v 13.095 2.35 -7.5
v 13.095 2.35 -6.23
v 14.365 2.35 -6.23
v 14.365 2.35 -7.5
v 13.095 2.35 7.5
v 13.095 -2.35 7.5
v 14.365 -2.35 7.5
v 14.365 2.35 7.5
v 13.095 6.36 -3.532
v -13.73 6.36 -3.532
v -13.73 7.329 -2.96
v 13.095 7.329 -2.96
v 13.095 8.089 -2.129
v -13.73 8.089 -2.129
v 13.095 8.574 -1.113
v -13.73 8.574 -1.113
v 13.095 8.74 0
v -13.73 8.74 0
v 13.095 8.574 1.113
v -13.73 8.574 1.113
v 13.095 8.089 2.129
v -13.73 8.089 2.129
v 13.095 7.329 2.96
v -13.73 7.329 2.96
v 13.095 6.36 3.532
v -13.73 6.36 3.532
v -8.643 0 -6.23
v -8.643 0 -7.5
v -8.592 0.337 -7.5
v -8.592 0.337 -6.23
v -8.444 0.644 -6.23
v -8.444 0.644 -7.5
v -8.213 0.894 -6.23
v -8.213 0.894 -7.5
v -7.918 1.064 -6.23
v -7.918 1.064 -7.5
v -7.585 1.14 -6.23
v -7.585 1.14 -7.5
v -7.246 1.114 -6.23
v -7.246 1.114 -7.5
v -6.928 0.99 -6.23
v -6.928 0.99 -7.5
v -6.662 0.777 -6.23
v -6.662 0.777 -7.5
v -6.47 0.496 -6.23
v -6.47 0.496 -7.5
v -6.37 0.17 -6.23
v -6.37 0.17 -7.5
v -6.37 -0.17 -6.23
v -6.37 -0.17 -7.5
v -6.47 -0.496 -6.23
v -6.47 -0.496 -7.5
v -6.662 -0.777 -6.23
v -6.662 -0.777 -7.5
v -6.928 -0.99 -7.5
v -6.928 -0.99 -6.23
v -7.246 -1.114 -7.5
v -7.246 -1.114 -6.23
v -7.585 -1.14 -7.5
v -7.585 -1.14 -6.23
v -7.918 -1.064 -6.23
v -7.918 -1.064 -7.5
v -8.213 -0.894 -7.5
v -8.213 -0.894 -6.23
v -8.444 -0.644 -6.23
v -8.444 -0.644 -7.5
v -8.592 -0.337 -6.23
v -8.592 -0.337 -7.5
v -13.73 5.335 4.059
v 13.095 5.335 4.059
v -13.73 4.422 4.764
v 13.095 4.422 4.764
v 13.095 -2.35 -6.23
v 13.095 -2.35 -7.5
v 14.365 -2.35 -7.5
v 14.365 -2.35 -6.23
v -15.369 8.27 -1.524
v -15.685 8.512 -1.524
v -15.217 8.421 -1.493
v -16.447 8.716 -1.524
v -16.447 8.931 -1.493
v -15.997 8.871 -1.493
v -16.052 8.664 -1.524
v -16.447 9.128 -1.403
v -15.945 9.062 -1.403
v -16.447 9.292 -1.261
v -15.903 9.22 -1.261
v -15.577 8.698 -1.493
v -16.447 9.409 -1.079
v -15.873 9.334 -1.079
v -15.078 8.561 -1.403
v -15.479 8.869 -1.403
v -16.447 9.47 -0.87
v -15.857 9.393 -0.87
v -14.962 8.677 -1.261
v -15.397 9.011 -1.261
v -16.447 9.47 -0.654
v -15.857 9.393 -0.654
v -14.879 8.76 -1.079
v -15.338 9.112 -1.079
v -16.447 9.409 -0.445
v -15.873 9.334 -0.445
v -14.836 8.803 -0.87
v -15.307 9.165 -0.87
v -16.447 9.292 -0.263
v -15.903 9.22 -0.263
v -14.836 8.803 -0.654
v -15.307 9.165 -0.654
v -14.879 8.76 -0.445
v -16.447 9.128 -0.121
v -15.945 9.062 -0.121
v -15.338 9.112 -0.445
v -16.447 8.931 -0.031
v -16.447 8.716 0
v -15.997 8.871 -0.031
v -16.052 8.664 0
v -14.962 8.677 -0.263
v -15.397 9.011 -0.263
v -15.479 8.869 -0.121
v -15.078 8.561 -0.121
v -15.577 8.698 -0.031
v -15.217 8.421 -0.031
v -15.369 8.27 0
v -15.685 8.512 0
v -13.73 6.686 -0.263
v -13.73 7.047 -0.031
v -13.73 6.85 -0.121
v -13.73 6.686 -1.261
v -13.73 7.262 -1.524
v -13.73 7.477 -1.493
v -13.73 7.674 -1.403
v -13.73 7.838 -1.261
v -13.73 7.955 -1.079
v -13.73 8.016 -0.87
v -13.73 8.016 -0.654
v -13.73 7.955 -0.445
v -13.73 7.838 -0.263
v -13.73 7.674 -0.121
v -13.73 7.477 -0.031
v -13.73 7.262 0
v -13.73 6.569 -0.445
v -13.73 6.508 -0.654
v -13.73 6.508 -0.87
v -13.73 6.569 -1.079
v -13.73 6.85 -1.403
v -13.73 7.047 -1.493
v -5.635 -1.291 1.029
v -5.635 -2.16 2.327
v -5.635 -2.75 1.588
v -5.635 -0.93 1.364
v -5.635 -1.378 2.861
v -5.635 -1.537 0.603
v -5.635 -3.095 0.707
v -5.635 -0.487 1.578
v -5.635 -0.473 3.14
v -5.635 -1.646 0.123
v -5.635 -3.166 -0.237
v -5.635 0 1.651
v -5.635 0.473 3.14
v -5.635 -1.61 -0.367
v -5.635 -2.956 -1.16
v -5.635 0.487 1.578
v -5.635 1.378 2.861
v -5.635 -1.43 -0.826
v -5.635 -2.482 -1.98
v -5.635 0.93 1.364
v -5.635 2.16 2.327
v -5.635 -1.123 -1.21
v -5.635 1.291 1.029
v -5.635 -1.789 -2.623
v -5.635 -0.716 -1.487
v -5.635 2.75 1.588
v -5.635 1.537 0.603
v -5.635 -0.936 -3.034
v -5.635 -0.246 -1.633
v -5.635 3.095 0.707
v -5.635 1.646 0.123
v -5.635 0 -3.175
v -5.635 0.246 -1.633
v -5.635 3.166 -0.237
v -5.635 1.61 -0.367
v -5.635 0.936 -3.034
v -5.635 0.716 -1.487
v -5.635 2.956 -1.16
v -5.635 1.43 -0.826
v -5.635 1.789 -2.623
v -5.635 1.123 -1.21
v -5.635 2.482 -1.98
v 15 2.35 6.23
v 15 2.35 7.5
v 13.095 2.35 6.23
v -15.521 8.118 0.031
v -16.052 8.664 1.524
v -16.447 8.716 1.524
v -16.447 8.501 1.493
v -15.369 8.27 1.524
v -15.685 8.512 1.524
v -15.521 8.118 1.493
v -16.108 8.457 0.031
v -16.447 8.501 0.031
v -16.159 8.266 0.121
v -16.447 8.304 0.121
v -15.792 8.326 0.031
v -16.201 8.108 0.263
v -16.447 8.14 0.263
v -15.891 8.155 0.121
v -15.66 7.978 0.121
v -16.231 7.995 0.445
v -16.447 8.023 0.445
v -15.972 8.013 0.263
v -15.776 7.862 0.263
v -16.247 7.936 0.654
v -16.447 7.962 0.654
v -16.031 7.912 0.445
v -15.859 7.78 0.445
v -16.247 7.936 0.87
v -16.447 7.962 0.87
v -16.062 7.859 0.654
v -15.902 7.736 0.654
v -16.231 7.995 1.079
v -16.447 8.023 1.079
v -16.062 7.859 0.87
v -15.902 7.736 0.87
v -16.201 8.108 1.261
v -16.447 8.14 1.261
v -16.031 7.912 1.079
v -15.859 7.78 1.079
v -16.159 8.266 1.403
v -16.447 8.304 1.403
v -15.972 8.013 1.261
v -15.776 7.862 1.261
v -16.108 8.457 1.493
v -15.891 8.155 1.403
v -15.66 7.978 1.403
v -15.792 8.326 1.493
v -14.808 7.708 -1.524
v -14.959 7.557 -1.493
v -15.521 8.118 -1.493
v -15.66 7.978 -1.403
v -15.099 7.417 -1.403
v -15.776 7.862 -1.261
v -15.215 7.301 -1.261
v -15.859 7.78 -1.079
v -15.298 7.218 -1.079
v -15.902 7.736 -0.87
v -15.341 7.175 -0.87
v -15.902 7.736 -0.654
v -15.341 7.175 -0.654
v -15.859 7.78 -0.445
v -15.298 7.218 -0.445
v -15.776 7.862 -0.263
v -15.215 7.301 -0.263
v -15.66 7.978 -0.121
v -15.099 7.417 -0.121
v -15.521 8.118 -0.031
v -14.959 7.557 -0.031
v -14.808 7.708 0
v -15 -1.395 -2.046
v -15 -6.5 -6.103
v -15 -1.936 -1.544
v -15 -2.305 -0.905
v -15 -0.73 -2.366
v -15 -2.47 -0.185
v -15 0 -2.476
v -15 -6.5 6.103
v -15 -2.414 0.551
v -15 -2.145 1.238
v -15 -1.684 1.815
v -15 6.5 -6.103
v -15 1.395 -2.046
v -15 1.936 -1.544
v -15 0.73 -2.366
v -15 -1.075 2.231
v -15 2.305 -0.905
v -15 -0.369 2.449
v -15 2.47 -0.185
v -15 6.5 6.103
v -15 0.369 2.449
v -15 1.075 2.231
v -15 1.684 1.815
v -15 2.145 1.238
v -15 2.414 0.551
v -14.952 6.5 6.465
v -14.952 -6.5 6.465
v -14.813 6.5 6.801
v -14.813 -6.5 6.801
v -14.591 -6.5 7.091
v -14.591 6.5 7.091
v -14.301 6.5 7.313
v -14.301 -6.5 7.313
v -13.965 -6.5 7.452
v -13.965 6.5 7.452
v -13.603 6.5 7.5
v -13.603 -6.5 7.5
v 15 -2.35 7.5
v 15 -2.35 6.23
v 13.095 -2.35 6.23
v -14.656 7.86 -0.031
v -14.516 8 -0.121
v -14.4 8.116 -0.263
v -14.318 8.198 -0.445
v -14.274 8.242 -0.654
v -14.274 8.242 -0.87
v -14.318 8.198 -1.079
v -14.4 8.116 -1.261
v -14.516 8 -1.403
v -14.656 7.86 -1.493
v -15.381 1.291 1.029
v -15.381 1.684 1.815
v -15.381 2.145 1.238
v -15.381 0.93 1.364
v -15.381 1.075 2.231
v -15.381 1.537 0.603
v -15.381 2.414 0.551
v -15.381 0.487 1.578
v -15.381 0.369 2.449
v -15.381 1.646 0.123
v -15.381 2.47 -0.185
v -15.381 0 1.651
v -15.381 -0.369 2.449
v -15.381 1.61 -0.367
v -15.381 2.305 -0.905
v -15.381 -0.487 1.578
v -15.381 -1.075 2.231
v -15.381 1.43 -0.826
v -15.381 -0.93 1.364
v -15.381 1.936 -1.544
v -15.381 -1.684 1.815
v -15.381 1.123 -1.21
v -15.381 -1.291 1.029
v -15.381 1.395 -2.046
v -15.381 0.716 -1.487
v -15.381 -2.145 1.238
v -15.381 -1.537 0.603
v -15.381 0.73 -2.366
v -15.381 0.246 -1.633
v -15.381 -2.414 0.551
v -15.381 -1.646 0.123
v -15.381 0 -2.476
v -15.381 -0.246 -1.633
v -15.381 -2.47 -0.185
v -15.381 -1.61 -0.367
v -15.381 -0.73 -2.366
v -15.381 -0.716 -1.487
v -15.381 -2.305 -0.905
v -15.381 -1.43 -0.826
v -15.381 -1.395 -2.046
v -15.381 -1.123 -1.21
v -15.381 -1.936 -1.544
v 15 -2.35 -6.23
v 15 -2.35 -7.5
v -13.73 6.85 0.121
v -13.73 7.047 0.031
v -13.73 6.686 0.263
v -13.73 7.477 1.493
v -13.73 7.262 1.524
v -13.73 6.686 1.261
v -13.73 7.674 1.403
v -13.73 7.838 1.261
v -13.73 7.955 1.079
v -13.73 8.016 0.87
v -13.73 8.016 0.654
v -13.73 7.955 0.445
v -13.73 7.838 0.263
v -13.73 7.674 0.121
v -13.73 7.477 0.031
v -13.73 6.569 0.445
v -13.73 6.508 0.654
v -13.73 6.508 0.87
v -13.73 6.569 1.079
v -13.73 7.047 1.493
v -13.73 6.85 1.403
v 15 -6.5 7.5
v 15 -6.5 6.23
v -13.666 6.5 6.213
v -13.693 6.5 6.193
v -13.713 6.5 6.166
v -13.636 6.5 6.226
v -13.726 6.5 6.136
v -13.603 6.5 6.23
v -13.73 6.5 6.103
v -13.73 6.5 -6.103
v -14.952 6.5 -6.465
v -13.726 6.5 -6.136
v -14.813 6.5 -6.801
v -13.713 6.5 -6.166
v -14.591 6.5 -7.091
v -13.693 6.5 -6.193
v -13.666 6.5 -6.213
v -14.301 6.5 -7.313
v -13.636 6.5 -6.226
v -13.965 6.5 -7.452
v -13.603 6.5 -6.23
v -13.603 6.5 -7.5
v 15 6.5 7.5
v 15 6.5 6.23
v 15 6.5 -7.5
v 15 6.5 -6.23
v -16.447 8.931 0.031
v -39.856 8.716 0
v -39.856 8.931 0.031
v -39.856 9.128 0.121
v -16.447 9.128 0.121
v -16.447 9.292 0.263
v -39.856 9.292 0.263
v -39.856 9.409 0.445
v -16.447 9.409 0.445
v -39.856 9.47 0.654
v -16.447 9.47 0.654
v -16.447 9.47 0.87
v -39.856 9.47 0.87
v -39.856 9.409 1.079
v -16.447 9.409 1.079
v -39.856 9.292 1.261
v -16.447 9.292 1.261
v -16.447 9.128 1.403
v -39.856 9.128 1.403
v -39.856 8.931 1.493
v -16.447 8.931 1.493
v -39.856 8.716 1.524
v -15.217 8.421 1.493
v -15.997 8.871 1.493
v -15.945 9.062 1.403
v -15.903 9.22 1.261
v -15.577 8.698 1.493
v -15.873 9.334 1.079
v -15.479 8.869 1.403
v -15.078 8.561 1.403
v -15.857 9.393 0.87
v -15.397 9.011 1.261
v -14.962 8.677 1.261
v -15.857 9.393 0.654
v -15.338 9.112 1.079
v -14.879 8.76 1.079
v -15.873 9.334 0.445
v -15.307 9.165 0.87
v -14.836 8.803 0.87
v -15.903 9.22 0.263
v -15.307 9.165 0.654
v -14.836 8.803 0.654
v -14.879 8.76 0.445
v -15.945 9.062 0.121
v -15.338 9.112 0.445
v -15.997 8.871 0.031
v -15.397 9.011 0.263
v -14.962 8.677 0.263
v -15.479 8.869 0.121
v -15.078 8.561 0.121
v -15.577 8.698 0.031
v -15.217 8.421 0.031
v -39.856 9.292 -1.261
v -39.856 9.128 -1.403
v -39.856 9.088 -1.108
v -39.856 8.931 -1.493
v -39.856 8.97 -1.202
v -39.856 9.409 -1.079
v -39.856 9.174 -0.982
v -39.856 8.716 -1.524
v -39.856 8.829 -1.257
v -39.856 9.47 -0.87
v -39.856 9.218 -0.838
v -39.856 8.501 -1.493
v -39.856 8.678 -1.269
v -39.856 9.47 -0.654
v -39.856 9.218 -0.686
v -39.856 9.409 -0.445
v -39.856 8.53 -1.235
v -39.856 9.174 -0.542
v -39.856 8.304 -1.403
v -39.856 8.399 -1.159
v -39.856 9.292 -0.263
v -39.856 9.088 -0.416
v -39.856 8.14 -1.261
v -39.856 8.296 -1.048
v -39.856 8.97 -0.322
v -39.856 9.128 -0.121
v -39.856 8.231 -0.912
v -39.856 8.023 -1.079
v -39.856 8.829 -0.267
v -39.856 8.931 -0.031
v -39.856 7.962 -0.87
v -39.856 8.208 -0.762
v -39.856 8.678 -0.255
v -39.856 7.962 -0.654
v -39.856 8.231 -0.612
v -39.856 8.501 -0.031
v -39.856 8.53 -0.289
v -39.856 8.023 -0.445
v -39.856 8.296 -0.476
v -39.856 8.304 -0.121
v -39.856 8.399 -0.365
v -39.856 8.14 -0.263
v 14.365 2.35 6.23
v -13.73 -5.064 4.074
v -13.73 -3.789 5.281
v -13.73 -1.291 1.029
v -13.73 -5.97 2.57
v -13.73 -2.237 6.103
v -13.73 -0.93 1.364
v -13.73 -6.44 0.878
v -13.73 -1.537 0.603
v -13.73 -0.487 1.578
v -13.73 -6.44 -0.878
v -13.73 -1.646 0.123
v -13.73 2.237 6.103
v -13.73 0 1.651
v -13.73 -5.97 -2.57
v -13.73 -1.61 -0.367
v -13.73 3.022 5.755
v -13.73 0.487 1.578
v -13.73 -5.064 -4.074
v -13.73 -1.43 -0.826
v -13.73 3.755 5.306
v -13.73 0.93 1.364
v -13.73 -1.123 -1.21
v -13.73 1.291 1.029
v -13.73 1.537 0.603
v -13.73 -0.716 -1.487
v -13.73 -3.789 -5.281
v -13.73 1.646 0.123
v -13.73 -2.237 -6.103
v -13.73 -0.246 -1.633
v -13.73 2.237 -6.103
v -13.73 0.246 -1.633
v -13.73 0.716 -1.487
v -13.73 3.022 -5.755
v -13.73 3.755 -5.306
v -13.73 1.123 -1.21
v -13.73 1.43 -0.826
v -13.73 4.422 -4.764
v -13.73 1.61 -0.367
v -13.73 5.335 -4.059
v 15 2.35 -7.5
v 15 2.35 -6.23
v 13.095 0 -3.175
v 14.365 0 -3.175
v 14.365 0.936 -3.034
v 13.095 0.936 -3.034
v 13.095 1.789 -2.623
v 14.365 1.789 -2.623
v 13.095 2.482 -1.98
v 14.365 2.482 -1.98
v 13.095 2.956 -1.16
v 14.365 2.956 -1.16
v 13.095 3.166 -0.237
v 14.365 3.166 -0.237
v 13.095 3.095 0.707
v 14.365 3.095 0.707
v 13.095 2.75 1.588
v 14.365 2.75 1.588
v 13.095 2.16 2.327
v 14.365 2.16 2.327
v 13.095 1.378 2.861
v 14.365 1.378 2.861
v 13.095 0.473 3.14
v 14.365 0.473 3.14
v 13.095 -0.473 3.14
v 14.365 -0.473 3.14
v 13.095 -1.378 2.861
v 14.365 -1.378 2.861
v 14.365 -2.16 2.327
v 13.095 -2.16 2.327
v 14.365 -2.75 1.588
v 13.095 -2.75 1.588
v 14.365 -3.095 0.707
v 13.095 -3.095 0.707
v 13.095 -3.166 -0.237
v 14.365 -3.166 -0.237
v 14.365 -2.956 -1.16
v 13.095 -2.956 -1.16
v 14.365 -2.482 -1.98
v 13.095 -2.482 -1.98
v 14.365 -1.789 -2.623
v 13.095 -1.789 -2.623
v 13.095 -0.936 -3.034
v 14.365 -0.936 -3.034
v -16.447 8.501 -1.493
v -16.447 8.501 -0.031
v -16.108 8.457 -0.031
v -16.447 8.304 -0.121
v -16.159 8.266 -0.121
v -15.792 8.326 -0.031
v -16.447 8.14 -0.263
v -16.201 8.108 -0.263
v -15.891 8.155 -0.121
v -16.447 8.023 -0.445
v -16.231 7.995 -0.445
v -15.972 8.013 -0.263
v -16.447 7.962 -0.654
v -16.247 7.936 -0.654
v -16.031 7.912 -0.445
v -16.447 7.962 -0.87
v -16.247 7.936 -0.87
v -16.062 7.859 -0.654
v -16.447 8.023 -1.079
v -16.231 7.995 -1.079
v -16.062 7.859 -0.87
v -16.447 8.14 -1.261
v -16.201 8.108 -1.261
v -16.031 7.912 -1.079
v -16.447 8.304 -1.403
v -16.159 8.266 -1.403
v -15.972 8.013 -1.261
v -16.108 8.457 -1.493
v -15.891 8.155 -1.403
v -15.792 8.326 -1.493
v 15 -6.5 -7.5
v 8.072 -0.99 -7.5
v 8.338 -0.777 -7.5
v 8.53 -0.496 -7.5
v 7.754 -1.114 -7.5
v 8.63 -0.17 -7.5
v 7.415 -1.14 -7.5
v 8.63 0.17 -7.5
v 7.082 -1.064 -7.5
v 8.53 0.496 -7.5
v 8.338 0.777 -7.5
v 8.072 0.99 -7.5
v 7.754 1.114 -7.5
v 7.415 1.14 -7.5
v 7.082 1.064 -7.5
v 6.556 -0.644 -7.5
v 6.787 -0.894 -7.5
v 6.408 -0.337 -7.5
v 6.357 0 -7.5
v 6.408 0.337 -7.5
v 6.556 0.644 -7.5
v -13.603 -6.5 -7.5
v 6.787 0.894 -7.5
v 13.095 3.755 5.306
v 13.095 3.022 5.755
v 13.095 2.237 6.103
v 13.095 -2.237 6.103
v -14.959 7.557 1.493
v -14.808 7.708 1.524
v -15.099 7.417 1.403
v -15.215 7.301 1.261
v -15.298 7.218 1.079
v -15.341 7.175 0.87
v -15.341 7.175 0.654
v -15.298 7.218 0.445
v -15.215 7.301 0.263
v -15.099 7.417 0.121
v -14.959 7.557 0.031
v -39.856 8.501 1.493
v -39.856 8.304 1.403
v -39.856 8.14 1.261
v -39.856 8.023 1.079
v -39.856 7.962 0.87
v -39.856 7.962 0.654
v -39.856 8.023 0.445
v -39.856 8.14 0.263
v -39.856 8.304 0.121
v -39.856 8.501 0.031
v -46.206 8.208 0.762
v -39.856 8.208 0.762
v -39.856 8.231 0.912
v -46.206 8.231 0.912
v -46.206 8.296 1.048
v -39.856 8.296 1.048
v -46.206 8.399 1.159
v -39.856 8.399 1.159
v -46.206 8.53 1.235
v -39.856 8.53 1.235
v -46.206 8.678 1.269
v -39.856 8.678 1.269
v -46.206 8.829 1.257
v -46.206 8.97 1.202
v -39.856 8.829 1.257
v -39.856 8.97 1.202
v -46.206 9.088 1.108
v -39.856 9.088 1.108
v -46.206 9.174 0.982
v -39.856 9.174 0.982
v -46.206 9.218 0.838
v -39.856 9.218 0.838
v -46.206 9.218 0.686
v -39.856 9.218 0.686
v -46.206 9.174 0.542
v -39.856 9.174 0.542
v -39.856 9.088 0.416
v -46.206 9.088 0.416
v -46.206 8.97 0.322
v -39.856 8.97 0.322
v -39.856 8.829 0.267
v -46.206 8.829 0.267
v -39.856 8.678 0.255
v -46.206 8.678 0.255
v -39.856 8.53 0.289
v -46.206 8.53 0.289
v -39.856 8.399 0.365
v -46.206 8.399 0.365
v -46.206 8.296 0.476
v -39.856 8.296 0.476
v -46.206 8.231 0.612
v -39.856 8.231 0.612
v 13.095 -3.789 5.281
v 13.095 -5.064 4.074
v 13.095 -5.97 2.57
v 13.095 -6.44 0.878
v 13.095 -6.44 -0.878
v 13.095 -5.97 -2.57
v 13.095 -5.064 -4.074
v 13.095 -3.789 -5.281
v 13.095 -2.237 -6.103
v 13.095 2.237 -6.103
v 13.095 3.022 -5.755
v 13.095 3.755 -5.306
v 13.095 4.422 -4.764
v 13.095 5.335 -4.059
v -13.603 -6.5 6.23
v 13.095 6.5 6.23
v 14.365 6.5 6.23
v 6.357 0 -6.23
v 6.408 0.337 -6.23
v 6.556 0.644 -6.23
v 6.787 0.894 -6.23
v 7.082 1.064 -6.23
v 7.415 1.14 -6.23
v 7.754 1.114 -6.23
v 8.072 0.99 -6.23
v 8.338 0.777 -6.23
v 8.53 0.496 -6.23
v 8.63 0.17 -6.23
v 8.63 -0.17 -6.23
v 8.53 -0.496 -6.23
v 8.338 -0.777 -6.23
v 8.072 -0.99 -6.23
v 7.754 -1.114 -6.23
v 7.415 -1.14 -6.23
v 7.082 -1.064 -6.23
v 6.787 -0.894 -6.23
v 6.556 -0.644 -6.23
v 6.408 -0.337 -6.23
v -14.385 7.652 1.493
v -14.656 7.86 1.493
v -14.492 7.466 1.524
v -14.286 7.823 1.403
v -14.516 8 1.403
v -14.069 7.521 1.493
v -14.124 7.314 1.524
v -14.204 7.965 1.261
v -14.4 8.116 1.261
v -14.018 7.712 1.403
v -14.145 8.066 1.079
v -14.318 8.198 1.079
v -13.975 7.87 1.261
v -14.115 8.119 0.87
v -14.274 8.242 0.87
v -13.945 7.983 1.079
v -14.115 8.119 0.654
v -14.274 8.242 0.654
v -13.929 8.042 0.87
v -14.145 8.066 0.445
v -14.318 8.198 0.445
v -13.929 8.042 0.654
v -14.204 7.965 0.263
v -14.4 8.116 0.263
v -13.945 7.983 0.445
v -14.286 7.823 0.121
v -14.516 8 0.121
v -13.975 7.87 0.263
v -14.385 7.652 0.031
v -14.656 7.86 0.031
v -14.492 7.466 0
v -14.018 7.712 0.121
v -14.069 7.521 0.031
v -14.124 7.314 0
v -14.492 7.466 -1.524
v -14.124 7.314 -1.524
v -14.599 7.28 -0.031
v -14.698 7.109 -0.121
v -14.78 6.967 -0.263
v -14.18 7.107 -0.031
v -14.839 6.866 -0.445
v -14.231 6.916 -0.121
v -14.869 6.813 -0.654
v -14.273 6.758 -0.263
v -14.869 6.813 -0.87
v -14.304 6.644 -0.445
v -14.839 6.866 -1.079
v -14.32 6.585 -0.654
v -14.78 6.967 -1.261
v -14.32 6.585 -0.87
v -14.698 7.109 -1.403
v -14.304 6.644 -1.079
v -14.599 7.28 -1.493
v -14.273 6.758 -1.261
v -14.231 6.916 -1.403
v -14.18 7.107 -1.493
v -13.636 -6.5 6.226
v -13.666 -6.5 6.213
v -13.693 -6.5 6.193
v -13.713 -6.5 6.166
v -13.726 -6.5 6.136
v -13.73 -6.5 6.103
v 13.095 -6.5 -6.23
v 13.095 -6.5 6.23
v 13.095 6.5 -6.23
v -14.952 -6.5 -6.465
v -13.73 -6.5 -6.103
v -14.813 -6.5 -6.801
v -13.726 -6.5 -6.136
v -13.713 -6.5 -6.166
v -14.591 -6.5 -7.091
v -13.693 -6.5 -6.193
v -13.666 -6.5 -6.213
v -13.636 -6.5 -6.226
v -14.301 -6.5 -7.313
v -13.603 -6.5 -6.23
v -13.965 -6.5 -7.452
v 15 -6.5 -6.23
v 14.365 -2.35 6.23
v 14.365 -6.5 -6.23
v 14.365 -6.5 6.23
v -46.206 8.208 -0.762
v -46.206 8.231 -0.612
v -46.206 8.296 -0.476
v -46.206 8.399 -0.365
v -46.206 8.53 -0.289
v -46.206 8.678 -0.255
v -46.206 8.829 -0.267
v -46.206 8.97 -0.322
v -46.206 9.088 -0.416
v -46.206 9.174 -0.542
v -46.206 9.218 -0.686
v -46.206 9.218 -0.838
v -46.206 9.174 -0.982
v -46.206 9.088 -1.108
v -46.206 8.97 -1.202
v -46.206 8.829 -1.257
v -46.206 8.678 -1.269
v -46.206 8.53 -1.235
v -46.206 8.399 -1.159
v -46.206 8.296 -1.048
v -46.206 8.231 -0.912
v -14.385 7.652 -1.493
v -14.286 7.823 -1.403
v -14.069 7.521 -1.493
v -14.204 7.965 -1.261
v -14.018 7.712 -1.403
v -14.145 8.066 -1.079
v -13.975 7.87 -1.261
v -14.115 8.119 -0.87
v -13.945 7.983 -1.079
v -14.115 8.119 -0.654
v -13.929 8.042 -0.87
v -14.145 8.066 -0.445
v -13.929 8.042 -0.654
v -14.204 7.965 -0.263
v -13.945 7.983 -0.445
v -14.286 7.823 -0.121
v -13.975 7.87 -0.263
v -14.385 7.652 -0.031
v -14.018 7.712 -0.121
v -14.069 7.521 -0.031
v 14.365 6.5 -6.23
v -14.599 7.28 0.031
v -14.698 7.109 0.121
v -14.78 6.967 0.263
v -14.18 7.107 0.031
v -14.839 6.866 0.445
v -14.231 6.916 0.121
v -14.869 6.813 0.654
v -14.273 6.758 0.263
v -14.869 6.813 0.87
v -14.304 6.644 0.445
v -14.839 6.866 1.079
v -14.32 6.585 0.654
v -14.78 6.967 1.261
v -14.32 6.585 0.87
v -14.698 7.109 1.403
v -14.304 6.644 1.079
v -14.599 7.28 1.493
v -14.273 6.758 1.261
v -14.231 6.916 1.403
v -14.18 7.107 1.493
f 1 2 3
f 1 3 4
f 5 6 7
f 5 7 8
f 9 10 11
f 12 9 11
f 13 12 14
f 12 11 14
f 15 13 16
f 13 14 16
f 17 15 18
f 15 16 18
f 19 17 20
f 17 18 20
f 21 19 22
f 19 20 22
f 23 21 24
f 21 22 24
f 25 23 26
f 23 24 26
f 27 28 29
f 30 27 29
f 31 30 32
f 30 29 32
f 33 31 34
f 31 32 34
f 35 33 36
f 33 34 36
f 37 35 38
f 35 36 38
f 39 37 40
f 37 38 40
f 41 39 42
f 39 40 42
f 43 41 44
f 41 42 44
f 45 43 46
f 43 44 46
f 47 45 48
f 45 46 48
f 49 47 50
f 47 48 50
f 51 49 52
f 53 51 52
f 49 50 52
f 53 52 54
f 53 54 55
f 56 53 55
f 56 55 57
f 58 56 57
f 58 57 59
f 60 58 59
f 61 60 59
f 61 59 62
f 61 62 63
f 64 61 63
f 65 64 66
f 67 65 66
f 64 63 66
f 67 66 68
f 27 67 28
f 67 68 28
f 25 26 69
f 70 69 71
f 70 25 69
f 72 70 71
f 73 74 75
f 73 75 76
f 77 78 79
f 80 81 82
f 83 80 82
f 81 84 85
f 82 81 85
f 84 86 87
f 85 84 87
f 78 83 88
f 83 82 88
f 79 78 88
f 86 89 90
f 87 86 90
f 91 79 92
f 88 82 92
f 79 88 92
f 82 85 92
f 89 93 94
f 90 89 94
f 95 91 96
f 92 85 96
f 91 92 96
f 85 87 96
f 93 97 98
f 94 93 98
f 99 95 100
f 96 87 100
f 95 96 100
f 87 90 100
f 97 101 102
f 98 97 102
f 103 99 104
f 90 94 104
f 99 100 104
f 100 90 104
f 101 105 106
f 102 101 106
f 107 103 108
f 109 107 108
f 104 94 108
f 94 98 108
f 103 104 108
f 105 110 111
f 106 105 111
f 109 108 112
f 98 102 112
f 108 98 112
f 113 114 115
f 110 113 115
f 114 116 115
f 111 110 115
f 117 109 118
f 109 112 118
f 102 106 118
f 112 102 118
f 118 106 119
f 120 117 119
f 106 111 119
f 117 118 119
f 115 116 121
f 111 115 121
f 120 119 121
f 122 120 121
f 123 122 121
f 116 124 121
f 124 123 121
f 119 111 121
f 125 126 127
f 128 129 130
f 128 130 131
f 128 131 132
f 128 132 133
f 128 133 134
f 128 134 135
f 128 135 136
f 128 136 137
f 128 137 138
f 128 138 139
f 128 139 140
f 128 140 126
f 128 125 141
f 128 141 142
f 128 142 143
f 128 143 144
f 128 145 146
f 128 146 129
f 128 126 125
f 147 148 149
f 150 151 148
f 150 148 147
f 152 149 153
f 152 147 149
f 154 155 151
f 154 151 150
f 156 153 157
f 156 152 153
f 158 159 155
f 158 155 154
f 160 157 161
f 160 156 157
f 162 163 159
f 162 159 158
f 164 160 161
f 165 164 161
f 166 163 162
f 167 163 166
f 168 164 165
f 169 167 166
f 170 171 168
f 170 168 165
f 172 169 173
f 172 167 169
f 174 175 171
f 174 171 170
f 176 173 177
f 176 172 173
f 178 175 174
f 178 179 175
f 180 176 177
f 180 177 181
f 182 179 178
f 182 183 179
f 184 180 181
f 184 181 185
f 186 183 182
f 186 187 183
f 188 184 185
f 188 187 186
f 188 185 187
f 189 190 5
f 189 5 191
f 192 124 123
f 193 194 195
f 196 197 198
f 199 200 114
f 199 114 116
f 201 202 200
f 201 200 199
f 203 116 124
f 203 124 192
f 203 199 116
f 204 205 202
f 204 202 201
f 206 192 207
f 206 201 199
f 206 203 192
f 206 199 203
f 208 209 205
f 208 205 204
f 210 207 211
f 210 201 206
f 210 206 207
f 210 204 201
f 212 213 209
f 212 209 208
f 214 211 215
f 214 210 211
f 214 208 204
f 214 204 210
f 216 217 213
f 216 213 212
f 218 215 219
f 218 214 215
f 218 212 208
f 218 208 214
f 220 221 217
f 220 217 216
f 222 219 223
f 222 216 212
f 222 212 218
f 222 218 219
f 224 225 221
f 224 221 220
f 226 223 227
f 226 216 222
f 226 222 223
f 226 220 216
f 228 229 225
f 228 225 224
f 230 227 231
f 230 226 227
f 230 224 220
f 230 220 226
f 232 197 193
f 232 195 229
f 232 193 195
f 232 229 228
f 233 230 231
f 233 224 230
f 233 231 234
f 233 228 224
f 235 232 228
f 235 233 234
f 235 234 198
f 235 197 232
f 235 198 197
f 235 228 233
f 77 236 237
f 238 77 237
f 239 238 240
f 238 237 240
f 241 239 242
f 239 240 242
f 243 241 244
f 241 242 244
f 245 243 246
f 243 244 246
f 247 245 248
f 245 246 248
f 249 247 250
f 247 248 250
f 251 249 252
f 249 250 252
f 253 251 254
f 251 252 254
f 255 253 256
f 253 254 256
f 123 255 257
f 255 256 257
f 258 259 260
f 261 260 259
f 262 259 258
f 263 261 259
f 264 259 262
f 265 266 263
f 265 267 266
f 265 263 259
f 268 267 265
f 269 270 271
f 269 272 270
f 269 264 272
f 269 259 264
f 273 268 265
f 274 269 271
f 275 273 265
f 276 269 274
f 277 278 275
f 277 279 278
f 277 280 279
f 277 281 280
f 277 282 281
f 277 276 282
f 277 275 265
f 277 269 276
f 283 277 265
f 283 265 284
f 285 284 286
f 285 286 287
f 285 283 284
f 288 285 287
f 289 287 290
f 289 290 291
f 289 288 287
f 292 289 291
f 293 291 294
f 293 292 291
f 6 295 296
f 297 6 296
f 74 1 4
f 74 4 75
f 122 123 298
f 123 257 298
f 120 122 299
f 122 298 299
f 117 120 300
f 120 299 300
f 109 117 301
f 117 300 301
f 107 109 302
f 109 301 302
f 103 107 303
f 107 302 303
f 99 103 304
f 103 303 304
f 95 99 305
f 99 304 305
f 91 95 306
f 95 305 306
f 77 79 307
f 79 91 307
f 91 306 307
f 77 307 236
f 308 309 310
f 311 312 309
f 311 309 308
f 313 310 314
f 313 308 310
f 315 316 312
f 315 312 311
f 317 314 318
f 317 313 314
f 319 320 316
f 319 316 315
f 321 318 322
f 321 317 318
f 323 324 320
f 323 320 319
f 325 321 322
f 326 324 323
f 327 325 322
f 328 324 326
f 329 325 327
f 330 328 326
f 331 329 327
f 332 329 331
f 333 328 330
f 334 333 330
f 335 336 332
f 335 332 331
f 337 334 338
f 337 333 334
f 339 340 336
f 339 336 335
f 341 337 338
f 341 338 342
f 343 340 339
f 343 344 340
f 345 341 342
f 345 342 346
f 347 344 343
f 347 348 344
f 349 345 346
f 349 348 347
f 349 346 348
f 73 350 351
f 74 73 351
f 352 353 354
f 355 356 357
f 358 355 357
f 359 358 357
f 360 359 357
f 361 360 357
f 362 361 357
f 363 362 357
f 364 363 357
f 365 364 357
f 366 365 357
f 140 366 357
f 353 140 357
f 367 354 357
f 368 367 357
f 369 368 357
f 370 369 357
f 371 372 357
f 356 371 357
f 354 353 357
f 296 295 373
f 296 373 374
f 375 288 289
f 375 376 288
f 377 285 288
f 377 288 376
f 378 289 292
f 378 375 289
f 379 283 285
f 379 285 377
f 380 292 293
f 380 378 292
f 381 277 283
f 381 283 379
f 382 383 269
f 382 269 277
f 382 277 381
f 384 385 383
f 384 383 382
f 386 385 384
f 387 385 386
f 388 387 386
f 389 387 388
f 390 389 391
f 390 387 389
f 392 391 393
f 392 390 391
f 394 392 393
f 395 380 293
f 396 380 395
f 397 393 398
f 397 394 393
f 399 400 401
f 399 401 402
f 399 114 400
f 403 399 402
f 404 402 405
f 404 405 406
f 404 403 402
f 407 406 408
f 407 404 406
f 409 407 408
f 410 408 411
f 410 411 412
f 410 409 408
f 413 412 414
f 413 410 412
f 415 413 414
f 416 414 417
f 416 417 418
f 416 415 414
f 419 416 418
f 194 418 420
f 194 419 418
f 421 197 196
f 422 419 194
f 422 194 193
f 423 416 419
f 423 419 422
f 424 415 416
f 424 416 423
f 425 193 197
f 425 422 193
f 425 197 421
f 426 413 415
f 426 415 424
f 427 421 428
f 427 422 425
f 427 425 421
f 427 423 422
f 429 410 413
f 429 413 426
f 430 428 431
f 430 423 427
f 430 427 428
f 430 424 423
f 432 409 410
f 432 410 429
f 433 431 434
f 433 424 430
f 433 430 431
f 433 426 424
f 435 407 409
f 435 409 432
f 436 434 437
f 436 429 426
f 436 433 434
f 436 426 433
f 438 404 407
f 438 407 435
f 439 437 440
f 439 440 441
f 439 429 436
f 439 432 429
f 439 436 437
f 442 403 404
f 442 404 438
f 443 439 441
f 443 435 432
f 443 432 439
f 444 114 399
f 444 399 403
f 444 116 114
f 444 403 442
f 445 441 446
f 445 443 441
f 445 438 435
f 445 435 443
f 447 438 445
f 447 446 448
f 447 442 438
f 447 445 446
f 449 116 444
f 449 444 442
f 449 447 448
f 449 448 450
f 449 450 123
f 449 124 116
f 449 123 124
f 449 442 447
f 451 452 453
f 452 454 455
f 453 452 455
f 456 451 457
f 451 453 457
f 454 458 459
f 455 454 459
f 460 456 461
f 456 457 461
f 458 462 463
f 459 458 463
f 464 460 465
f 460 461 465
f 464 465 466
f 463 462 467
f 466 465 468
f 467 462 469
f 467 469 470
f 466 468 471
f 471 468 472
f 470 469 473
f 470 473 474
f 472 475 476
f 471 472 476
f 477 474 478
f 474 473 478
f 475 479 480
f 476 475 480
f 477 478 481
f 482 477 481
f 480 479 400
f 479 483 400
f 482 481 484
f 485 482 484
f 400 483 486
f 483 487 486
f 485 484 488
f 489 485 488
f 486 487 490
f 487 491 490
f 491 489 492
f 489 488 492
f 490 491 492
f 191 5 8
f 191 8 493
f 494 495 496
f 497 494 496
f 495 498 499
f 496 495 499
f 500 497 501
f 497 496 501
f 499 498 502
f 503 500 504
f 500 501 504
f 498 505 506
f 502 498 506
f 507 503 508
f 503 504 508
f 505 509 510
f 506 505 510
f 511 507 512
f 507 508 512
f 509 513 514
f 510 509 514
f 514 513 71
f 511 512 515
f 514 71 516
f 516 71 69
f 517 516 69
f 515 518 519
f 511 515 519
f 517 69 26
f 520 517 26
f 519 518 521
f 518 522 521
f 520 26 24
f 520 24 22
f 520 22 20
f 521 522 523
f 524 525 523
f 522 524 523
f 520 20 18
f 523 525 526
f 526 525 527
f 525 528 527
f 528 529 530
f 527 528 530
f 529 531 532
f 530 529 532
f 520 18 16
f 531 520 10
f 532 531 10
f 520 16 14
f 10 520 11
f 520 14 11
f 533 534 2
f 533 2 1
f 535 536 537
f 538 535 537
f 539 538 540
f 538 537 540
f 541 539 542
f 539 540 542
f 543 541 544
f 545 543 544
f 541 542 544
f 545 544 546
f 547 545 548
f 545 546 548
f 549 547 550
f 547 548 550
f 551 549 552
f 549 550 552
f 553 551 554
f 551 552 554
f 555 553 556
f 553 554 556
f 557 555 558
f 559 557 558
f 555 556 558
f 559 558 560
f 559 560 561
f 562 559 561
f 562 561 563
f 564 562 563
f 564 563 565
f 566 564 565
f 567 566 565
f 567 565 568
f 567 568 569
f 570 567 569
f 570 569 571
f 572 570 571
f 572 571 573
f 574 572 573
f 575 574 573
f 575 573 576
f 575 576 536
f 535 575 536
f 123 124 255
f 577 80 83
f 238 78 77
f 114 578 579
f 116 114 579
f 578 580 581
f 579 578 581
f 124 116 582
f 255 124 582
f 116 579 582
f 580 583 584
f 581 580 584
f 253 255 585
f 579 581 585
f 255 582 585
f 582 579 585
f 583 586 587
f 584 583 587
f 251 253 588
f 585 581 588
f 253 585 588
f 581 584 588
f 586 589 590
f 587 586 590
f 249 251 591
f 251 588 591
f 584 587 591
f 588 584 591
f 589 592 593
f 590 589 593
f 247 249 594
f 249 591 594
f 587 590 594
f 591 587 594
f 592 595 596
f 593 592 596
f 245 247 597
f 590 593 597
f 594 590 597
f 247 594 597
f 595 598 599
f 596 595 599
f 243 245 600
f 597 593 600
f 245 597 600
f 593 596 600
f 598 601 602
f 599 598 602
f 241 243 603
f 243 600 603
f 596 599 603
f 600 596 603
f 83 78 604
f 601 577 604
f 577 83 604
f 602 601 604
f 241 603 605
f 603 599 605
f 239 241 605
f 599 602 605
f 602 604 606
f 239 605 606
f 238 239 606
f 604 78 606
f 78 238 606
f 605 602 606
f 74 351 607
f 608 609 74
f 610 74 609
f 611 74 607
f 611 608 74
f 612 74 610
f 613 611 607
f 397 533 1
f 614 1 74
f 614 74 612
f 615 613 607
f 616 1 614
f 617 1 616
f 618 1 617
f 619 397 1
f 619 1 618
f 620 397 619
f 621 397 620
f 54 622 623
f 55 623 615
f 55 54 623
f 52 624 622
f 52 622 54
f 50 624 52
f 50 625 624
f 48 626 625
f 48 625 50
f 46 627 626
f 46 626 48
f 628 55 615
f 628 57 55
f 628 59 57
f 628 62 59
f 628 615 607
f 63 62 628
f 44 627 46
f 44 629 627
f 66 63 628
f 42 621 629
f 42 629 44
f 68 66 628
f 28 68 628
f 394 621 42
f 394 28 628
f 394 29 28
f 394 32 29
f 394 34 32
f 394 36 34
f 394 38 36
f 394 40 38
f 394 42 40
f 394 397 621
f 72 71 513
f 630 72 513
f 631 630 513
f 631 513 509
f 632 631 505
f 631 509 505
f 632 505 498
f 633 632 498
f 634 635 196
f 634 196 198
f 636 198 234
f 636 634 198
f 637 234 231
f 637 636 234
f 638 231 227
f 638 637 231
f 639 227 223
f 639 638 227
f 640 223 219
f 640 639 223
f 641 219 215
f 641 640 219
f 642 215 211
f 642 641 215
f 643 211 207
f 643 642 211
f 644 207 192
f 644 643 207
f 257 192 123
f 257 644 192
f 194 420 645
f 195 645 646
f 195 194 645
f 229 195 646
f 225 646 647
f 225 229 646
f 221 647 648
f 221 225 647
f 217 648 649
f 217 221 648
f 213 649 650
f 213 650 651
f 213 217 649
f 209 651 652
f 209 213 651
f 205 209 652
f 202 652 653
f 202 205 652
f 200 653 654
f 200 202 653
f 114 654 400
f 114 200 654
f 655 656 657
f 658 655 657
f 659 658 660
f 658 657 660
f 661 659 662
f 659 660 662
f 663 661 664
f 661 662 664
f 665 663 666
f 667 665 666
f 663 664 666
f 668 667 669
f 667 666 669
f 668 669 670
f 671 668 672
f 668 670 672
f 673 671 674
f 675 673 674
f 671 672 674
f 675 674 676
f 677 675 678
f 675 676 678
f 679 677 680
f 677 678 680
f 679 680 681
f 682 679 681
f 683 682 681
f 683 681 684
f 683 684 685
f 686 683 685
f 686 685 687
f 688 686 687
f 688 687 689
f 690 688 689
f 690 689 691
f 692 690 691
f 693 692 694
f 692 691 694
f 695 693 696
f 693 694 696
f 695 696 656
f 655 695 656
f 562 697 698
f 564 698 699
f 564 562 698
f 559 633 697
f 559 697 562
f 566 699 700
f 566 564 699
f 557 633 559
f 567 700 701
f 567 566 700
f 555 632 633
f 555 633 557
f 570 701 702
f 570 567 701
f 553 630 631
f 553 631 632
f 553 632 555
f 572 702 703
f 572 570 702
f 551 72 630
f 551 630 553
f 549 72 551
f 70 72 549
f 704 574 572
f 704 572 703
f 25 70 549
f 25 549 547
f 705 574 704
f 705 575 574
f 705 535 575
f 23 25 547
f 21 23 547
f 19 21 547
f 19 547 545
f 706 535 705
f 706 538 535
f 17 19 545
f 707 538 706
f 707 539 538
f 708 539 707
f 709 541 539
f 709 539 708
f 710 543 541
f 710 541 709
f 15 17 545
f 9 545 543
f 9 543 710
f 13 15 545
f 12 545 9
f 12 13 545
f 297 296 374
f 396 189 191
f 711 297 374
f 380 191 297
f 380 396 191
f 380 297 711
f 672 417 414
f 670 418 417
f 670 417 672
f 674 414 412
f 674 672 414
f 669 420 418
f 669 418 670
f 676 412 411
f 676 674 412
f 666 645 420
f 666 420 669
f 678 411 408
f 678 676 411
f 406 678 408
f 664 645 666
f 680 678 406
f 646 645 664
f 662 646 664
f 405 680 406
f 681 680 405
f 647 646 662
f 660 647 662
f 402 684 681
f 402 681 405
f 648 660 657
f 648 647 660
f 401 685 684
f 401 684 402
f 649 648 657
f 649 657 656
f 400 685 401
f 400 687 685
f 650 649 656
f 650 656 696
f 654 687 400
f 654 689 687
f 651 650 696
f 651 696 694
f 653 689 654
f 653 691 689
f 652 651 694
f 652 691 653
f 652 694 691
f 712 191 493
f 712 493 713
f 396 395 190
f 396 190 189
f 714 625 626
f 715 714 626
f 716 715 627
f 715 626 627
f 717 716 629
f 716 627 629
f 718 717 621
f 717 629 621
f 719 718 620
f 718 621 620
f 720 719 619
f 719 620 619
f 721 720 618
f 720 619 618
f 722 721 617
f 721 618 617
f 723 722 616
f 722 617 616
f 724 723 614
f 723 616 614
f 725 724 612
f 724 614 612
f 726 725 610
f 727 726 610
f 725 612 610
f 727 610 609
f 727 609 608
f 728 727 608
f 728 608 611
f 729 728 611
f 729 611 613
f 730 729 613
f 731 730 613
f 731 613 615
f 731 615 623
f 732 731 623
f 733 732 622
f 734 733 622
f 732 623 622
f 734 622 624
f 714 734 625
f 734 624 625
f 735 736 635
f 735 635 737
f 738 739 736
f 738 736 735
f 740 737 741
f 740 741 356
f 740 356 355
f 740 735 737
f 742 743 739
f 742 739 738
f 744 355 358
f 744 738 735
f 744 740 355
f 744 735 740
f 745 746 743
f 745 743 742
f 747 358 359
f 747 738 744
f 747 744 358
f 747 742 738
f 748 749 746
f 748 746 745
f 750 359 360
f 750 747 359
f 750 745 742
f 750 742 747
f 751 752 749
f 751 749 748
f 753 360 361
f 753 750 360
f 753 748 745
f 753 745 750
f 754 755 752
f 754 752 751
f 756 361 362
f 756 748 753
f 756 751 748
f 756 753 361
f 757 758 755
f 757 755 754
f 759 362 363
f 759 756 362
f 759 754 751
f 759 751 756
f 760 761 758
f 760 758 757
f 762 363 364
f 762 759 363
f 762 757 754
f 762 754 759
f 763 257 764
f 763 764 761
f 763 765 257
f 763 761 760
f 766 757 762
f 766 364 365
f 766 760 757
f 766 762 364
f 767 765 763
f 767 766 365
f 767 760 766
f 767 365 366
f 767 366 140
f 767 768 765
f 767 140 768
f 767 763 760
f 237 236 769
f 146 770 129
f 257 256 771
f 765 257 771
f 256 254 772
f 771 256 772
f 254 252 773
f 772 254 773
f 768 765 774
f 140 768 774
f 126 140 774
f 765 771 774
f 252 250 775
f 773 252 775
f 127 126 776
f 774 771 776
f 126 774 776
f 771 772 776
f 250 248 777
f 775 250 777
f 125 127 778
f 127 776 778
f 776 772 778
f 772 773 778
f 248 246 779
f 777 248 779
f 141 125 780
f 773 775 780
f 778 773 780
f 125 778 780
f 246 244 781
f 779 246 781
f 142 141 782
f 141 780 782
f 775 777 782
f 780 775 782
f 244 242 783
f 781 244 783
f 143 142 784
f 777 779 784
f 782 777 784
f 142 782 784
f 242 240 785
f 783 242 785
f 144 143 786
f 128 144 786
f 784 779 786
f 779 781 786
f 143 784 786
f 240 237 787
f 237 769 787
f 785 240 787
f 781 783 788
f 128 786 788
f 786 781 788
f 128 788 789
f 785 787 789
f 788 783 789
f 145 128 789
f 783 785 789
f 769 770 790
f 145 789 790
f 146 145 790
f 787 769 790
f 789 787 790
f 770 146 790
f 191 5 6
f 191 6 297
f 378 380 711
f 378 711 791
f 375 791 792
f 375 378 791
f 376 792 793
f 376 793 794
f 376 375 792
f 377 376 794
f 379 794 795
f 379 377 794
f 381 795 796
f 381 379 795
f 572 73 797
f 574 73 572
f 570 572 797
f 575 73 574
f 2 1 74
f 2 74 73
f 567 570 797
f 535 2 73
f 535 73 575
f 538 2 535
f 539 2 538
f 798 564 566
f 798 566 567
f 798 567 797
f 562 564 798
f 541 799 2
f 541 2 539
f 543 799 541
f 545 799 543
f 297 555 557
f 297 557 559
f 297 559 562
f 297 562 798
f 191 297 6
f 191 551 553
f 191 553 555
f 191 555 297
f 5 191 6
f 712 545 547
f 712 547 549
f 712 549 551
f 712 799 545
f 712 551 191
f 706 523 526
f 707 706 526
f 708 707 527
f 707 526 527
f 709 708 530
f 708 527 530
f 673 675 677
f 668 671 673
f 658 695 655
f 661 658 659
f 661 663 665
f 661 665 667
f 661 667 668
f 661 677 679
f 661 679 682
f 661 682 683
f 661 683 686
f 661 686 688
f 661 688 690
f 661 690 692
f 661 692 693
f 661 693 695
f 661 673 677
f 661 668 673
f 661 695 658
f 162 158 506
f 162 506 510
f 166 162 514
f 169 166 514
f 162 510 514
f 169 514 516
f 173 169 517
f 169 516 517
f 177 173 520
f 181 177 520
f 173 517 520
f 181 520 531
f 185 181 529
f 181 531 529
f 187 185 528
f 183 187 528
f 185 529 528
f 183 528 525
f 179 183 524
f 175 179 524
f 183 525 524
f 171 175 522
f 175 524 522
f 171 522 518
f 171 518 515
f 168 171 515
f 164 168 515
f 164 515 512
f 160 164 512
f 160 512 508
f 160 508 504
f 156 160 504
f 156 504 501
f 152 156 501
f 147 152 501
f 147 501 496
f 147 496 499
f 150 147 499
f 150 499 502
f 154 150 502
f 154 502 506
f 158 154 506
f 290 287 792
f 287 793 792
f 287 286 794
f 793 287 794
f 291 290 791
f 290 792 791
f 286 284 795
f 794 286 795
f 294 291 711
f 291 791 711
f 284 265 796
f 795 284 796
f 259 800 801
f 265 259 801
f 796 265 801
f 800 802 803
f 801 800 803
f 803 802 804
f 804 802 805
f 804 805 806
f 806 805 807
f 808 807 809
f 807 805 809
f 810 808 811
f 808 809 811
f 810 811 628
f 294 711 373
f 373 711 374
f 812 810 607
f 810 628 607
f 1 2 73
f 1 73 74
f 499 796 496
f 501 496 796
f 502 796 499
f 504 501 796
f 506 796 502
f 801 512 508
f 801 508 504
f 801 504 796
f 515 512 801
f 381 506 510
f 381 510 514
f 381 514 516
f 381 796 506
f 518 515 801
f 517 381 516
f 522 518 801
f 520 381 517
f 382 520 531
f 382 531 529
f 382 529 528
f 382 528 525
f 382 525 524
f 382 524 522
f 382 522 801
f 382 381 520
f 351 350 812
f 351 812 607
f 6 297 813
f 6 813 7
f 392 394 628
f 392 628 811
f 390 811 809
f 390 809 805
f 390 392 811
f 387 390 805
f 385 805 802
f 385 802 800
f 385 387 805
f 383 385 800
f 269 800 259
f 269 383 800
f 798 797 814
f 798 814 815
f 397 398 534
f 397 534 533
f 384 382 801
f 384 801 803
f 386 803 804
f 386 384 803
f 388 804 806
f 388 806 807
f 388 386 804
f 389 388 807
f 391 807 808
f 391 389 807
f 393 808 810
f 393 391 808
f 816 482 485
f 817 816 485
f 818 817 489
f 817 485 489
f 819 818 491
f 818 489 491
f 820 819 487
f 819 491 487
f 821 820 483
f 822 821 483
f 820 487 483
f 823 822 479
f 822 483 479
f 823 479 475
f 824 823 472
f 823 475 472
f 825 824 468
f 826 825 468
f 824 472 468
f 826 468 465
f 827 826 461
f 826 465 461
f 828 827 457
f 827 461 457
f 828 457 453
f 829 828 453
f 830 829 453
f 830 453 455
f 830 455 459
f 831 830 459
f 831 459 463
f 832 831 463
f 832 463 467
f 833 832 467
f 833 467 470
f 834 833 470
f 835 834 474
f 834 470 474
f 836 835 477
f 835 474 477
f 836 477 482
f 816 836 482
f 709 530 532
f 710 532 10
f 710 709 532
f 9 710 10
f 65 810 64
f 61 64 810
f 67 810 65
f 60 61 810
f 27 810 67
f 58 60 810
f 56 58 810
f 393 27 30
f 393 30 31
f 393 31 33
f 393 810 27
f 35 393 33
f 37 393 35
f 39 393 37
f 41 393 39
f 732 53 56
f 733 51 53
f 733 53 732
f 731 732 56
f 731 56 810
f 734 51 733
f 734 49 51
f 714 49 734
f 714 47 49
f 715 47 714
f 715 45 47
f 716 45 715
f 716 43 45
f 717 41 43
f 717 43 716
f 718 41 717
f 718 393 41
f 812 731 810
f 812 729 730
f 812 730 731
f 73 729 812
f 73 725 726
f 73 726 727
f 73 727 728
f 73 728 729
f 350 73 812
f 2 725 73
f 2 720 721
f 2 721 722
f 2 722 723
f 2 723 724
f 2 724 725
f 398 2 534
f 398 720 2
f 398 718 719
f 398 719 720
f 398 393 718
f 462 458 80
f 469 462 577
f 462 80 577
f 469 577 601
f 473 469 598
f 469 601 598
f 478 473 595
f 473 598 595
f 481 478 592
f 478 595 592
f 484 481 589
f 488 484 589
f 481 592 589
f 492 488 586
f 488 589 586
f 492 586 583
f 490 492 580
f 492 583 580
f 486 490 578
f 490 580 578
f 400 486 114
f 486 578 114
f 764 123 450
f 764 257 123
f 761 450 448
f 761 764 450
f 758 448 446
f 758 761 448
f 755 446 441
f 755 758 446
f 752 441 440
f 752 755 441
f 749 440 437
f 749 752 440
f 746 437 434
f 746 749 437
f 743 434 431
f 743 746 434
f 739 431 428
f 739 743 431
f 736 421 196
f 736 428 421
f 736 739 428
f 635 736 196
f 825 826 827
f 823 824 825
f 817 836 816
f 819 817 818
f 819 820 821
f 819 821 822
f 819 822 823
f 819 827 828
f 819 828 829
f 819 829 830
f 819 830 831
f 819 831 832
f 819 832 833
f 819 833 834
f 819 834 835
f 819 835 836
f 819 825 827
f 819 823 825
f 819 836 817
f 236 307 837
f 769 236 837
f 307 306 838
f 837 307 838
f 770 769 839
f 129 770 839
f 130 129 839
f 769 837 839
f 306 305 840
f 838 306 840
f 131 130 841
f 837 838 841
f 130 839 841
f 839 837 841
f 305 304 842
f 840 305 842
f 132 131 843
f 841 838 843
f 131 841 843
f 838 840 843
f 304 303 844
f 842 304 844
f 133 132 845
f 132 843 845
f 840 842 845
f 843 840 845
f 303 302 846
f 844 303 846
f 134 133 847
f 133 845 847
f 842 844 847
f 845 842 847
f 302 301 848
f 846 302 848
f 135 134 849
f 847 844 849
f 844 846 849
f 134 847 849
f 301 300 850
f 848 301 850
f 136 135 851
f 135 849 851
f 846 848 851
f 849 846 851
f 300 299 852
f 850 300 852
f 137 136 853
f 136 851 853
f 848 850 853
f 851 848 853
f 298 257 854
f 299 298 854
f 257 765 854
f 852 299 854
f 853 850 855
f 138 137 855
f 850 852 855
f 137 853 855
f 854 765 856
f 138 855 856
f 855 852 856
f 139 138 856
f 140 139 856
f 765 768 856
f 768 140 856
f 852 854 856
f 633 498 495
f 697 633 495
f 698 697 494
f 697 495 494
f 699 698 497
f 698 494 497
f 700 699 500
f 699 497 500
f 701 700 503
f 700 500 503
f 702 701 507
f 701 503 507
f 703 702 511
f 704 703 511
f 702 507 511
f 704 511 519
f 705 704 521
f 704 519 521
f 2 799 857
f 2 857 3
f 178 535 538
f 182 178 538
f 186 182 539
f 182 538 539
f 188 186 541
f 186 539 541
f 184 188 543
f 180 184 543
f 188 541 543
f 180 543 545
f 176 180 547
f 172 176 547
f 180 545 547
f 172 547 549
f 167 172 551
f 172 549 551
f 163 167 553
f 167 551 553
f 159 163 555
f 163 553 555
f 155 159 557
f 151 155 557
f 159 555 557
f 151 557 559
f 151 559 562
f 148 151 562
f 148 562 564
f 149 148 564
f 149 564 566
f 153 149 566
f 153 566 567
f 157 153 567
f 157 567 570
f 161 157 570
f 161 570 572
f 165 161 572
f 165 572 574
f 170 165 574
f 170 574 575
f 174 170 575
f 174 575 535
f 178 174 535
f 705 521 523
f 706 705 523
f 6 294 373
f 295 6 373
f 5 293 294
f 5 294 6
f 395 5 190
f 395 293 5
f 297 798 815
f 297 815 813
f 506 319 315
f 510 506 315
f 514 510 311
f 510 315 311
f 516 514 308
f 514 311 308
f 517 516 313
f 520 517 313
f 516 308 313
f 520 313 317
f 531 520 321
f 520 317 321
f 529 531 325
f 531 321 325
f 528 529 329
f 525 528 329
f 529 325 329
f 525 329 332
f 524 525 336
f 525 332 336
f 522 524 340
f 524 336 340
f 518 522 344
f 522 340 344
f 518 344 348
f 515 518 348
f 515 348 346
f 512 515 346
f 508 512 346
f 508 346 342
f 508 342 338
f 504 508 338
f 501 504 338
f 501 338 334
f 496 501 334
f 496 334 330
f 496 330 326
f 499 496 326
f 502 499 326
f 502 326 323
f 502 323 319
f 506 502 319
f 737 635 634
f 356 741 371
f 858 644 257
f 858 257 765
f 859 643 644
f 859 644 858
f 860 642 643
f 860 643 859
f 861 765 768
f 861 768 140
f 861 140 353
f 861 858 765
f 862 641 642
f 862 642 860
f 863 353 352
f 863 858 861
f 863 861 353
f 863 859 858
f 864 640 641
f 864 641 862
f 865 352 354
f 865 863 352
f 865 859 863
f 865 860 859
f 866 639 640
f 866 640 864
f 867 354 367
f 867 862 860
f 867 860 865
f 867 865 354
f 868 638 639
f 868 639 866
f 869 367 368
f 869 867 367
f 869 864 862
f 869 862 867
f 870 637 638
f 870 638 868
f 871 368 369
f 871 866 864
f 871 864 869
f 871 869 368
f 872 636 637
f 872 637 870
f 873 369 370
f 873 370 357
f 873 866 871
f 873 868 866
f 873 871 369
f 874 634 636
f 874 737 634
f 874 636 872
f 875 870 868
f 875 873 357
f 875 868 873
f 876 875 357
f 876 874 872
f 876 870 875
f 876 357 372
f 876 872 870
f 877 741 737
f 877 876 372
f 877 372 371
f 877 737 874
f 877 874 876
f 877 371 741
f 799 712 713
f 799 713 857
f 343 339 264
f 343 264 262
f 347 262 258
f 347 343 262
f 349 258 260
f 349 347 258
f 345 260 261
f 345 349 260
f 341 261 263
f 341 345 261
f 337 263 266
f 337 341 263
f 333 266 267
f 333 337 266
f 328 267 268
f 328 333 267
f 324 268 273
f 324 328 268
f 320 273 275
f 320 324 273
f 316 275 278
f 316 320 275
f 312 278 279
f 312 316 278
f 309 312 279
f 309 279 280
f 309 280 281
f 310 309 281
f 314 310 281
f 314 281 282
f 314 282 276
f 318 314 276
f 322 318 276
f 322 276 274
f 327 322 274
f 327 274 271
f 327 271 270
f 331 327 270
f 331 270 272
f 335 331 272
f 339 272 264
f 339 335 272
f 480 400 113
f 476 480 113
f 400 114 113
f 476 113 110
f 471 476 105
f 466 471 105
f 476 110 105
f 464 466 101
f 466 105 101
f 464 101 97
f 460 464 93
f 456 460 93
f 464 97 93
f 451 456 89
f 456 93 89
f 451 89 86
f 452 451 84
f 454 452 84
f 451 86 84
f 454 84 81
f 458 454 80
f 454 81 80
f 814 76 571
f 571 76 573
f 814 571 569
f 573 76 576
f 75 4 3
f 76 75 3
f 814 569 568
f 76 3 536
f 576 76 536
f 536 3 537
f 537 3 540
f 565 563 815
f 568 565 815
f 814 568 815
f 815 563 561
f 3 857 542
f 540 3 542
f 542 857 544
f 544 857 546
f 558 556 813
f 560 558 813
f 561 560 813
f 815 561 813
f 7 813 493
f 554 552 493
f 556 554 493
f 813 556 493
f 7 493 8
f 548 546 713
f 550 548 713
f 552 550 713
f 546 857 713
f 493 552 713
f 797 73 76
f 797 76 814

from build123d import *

# Parameters (mm, degrees)
T_LE_DE_BASE_PLI_E1_DEPTH = 6.5
ESQUISSE6_W               = 1.27
ESQUISSE6_H               = 4.699
ENL_V_MAT_EXTRU_1_DEPTH   = 1.905
BOSS_EXTRU_1_DEPTH        = 1.27
BOSS_EXTRU_2_DEPTH        = 26.825
CONG_1_R                  = 6.35
ESQUISSE9_R               = 0.762
ESQUISSE13_R              = 1.651
ENL_V_MAT_EXTRU_2_DEPTH   = 33.343199779
BOSS_EXTRU_3_START        = 0.381
ESQUISSE14_R              = 2.4765
ESQUISSE14_R_2            = 1.651
BOSS_EXTRU_3_DEPTH        = 0.381
ESQUISSE15_R              = 3.175
ENL_V_MAT_EXTRU_3_DEPTH   = 20
ESQUISSE17_R              = 0.508
BOSS_EXTRU_4_DEPTH        = 6.35
ESQUISSE19_R              = 1.143
ENL_V_MAT_EXTRU_7_DEPTH   = 1.27


# Read off the part's stored shape, not the designer's step: Boss.-Extru.2
# Sheet-metal steps are written as plain solids
with BuildPart() as part:
    # Esquisse1 → Tôle de base pliée1 (new, symmetric)
    with BuildSketch(Plane(origin=(0, 0, 0), x_dir=(1, 0, 0), z_dir=(0, 1, 0))):
        with BuildLine():
            Line((15, 7.5), (-13.603, 7.5))
            ThreePointArc((-13.603, 7.5), (-14.590828173, 7.090828173), (-15, 6.103))
            Line((-15, 6.103), (-15, -6.103))
            ThreePointArc((-15, -6.103), (-14.590828173, -7.090828173), (-13.603, -7.5))
            Line((-13.603, -7.5), (15, -7.5))
            Line((15, -7.5), (15, -6.23))
            Line((15, -6.23), (-13.603, -6.23))
            ThreePointArc((-13.603, -6.23), (-13.692802561, -6.192802561), (-13.73, -6.103))
            Line((-13.73, -6.103), (-13.73, 6.103))
            ThreePointArc((-13.73, 6.103), (-13.692802561, 6.192802561), (-13.603, 6.23))
            Line((-13.603, 6.23), (15, 6.23))
            Line((15, 6.23), (15, 7.5))
        make_face()
    extrude(amount=T_LE_DE_BASE_PLI_E1_DEPTH, both=True)

    # Esquisse6 → Enlèv. mat.-Extru.1 (cut)
    with BuildSketch(Plane(origin=(15, 0, 0), x_dir=(0, 0, -1), z_dir=(1, 0, 0))):
        with Locations((-6.865, 0)):
            Rectangle(ESQUISSE6_W, ESQUISSE6_H)
        with Locations((6.865, 0)):
            Rectangle(ESQUISSE6_W, ESQUISSE6_H)
    extrude(amount=-ENL_V_MAT_EXTRU_1_DEPTH, mode=Mode.SUBTRACT)


with BuildPart() as body_2:
    # Esquisse7 → Boss.-Extru.1 (new body)
    with BuildSketch(Plane(origin=(13.095, 0, 0), x_dir=(0, 0, -1), z_dir=(1, 0, 0))):
        Polygon((-7.5, 2.3495), (-6.23, 2.3495), (-6.23, 6.5), (6.23, 6.5), (6.23, 2.3495), (7.5, 2.3495), (7.5, -2.3495), (6.23, -2.3495), (6.23, -6.5), (-6.23, -6.5), (-6.23, -2.3495), (-7.5, -2.3495), align=None)
    extrude(amount=BOSS_EXTRU_1_DEPTH)


with BuildPart() as body_3:
    # Boss.-Extru.2 outline → Boss.-Extru.2 (new body)
    with BuildSketch(Plane(origin=(-13.73, 0, 0), x_dir=(0, 0, -1), z_dir=(1, 0, 0))):
        with BuildLine():
            ThreePointArc((6.103, 2.2368261), (5.176867338, 3.93065447), (3.794095002, 5.277768763))
            ThreePointArc((3.794095002, 5.277768763), (0, 8.74), (-3.794095002, 5.277768763))
            ThreePointArc((-3.794095002, 5.277768763), (-5.176867338, 3.93065447), (-6.103, 2.2368261))
            Line((-6.103, 2.2368261), (-6.103, -2.2368261))
            ThreePointArc((-6.103, -2.2368261), (0, -6.5), (6.103, -2.2368261))
            Line((6.103, -2.2368261), (6.103, 2.2368261))
        make_face()
    extrude(amount=BOSS_EXTRU_2_DEPTH)

    # Congé1
    cong_1_edges = [body_3.edges().sort_by_distance(p)[0] for p in [
        (-0.3175, 5.277768763, -3.794095002),
        (-0.3175, 5.277768763, 3.794095002),
    ]]
    fillet(cong_1_edges, radius=CONG_1_R)


with BuildPart() as body_4:
    # Balayage2: sweep along a path in Esquisse10
    with BuildLine(Plane.XY) as balayage2_path:
        Line((-39.855830676, 8.716004539), (-16.446527477, 8.716004539))
        ThreePointArc((-16.446527477, 8.716004539), (-15.863317926, 8.599996946), (-15.368896742, 8.269635273))
        Line((-15.368896742, 8.269635273), (-14.807630735, 7.708369265))
        ThreePointArc((-14.807630735, 7.708369265), (-14.313209551, 7.378007592), (-13.73, 7.262))
    # Esquisse9 → Balayage2 (sweep)
    with BuildSketch(Plane.ZY.offset(13.73)):
        with Locations((0.762, 7.262)):
            Circle(ESQUISSE9_R)
    sweep(path=balayage2_path.line)


with BuildPart() as body_5:
    # Symétrie1: mirrored copy
    add(body_4.part.mirror(Plane.XY))


with BuildPart() as enl_v_mat_extru_2_tool:
    # Esquisse13 → Enlèv. mat.-Extru.2 (new, through all)
    with BuildSketch(Plane.ZY.offset(15)):
        Circle(ESQUISSE13_R)
    extrude(amount=-ENL_V_MAT_EXTRU_2_DEPTH)


with BuildPart() as part_1:
    add(part.part)

    # Enlèv. mat.-Extru.2: cut by enl_v_mat_extru_2_tool
    add(enl_v_mat_extru_2_tool.part, mode=Mode.SUBTRACT)

    # Esquisse14 → Boss.-Extru.3 (add)
    with BuildSketch(Plane.ZY.offset(15).offset(BOSS_EXTRU_3_START)):
        with Locations(Location((0, 0, 0), (0, 0, 180))):
            Circle(ESQUISSE14_R)
        Circle(ESQUISSE14_R_2, mode=Mode.SUBTRACT)
    extrude(amount=-BOSS_EXTRU_3_DEPTH)

    # Esquisse19 → Enlèv. mat.-Extru.7 (cut)
    with BuildSketch(Plane(origin=(0, 0, -7.5), x_dir=(-1, 0, 0), z_dir=(0, 0, -1))):
        with Locations((-7.5, 0)):
            Circle(ESQUISSE19_R)
        with Locations((7.5, 0)):
            Circle(ESQUISSE19_R)
    extrude(amount=-ENL_V_MAT_EXTRU_7_DEPTH, mode=Mode.SUBTRACT)


with BuildPart() as body_2_1:
    add(body_2.part)

    # Enlèv. mat.-Extru.2: cut by enl_v_mat_extru_2_tool
    add(enl_v_mat_extru_2_tool.part, mode=Mode.SUBTRACT)


with BuildPart() as body_3_1:
    add(body_3.part)

    # Enlèv. mat.-Extru.2: cut by enl_v_mat_extru_2_tool
    add(enl_v_mat_extru_2_tool.part, mode=Mode.SUBTRACT)


with BuildPart() as enl_v_mat_extru_3_tool:
    # Esquisse15 → Enlèv. mat.-Extru.3 (new body)
    with BuildSketch(Plane(origin=(14.365, 0, 0), x_dir=(0, 0, -1), z_dir=(1, 0, 0))):
        Circle(ESQUISSE15_R)
    extrude(amount=-ENL_V_MAT_EXTRU_3_DEPTH)


with BuildPart() as body_2_2:
    add(body_2_1.part)

    # Enlèv. mat.-Extru.3: cut by enl_v_mat_extru_3_tool
    add(enl_v_mat_extru_3_tool.part, mode=Mode.SUBTRACT)


with BuildPart() as body_3_2:
    add(body_3_1.part)

    # Enlèv. mat.-Extru.3: cut by enl_v_mat_extru_3_tool
    add(enl_v_mat_extru_3_tool.part, mode=Mode.SUBTRACT)


with BuildPart() as body_4_1:
    add(body_4.part)

    add(body_5.part)  # Boss.-Extru.4 merges body 5
    # Esquisse17 → Boss.-Extru.4 (add)
    with BuildSketch(Plane.ZY.offset(39.855830676)):
        with Locations(Location((-0.762, 8.716004539, 0), (0, 0, 270))):
            Circle(ESQUISSE17_R)
        with Locations(Location((0.762, 8.716004539, 0), (0, 0, 270))):
            Circle(ESQUISSE17_R)
    extrude(amount=BOSS_EXTRU_4_DEPTH)


solid = Compound([part_1.part, body_2_2.part, body_3_2.part, body_4_1.part])
